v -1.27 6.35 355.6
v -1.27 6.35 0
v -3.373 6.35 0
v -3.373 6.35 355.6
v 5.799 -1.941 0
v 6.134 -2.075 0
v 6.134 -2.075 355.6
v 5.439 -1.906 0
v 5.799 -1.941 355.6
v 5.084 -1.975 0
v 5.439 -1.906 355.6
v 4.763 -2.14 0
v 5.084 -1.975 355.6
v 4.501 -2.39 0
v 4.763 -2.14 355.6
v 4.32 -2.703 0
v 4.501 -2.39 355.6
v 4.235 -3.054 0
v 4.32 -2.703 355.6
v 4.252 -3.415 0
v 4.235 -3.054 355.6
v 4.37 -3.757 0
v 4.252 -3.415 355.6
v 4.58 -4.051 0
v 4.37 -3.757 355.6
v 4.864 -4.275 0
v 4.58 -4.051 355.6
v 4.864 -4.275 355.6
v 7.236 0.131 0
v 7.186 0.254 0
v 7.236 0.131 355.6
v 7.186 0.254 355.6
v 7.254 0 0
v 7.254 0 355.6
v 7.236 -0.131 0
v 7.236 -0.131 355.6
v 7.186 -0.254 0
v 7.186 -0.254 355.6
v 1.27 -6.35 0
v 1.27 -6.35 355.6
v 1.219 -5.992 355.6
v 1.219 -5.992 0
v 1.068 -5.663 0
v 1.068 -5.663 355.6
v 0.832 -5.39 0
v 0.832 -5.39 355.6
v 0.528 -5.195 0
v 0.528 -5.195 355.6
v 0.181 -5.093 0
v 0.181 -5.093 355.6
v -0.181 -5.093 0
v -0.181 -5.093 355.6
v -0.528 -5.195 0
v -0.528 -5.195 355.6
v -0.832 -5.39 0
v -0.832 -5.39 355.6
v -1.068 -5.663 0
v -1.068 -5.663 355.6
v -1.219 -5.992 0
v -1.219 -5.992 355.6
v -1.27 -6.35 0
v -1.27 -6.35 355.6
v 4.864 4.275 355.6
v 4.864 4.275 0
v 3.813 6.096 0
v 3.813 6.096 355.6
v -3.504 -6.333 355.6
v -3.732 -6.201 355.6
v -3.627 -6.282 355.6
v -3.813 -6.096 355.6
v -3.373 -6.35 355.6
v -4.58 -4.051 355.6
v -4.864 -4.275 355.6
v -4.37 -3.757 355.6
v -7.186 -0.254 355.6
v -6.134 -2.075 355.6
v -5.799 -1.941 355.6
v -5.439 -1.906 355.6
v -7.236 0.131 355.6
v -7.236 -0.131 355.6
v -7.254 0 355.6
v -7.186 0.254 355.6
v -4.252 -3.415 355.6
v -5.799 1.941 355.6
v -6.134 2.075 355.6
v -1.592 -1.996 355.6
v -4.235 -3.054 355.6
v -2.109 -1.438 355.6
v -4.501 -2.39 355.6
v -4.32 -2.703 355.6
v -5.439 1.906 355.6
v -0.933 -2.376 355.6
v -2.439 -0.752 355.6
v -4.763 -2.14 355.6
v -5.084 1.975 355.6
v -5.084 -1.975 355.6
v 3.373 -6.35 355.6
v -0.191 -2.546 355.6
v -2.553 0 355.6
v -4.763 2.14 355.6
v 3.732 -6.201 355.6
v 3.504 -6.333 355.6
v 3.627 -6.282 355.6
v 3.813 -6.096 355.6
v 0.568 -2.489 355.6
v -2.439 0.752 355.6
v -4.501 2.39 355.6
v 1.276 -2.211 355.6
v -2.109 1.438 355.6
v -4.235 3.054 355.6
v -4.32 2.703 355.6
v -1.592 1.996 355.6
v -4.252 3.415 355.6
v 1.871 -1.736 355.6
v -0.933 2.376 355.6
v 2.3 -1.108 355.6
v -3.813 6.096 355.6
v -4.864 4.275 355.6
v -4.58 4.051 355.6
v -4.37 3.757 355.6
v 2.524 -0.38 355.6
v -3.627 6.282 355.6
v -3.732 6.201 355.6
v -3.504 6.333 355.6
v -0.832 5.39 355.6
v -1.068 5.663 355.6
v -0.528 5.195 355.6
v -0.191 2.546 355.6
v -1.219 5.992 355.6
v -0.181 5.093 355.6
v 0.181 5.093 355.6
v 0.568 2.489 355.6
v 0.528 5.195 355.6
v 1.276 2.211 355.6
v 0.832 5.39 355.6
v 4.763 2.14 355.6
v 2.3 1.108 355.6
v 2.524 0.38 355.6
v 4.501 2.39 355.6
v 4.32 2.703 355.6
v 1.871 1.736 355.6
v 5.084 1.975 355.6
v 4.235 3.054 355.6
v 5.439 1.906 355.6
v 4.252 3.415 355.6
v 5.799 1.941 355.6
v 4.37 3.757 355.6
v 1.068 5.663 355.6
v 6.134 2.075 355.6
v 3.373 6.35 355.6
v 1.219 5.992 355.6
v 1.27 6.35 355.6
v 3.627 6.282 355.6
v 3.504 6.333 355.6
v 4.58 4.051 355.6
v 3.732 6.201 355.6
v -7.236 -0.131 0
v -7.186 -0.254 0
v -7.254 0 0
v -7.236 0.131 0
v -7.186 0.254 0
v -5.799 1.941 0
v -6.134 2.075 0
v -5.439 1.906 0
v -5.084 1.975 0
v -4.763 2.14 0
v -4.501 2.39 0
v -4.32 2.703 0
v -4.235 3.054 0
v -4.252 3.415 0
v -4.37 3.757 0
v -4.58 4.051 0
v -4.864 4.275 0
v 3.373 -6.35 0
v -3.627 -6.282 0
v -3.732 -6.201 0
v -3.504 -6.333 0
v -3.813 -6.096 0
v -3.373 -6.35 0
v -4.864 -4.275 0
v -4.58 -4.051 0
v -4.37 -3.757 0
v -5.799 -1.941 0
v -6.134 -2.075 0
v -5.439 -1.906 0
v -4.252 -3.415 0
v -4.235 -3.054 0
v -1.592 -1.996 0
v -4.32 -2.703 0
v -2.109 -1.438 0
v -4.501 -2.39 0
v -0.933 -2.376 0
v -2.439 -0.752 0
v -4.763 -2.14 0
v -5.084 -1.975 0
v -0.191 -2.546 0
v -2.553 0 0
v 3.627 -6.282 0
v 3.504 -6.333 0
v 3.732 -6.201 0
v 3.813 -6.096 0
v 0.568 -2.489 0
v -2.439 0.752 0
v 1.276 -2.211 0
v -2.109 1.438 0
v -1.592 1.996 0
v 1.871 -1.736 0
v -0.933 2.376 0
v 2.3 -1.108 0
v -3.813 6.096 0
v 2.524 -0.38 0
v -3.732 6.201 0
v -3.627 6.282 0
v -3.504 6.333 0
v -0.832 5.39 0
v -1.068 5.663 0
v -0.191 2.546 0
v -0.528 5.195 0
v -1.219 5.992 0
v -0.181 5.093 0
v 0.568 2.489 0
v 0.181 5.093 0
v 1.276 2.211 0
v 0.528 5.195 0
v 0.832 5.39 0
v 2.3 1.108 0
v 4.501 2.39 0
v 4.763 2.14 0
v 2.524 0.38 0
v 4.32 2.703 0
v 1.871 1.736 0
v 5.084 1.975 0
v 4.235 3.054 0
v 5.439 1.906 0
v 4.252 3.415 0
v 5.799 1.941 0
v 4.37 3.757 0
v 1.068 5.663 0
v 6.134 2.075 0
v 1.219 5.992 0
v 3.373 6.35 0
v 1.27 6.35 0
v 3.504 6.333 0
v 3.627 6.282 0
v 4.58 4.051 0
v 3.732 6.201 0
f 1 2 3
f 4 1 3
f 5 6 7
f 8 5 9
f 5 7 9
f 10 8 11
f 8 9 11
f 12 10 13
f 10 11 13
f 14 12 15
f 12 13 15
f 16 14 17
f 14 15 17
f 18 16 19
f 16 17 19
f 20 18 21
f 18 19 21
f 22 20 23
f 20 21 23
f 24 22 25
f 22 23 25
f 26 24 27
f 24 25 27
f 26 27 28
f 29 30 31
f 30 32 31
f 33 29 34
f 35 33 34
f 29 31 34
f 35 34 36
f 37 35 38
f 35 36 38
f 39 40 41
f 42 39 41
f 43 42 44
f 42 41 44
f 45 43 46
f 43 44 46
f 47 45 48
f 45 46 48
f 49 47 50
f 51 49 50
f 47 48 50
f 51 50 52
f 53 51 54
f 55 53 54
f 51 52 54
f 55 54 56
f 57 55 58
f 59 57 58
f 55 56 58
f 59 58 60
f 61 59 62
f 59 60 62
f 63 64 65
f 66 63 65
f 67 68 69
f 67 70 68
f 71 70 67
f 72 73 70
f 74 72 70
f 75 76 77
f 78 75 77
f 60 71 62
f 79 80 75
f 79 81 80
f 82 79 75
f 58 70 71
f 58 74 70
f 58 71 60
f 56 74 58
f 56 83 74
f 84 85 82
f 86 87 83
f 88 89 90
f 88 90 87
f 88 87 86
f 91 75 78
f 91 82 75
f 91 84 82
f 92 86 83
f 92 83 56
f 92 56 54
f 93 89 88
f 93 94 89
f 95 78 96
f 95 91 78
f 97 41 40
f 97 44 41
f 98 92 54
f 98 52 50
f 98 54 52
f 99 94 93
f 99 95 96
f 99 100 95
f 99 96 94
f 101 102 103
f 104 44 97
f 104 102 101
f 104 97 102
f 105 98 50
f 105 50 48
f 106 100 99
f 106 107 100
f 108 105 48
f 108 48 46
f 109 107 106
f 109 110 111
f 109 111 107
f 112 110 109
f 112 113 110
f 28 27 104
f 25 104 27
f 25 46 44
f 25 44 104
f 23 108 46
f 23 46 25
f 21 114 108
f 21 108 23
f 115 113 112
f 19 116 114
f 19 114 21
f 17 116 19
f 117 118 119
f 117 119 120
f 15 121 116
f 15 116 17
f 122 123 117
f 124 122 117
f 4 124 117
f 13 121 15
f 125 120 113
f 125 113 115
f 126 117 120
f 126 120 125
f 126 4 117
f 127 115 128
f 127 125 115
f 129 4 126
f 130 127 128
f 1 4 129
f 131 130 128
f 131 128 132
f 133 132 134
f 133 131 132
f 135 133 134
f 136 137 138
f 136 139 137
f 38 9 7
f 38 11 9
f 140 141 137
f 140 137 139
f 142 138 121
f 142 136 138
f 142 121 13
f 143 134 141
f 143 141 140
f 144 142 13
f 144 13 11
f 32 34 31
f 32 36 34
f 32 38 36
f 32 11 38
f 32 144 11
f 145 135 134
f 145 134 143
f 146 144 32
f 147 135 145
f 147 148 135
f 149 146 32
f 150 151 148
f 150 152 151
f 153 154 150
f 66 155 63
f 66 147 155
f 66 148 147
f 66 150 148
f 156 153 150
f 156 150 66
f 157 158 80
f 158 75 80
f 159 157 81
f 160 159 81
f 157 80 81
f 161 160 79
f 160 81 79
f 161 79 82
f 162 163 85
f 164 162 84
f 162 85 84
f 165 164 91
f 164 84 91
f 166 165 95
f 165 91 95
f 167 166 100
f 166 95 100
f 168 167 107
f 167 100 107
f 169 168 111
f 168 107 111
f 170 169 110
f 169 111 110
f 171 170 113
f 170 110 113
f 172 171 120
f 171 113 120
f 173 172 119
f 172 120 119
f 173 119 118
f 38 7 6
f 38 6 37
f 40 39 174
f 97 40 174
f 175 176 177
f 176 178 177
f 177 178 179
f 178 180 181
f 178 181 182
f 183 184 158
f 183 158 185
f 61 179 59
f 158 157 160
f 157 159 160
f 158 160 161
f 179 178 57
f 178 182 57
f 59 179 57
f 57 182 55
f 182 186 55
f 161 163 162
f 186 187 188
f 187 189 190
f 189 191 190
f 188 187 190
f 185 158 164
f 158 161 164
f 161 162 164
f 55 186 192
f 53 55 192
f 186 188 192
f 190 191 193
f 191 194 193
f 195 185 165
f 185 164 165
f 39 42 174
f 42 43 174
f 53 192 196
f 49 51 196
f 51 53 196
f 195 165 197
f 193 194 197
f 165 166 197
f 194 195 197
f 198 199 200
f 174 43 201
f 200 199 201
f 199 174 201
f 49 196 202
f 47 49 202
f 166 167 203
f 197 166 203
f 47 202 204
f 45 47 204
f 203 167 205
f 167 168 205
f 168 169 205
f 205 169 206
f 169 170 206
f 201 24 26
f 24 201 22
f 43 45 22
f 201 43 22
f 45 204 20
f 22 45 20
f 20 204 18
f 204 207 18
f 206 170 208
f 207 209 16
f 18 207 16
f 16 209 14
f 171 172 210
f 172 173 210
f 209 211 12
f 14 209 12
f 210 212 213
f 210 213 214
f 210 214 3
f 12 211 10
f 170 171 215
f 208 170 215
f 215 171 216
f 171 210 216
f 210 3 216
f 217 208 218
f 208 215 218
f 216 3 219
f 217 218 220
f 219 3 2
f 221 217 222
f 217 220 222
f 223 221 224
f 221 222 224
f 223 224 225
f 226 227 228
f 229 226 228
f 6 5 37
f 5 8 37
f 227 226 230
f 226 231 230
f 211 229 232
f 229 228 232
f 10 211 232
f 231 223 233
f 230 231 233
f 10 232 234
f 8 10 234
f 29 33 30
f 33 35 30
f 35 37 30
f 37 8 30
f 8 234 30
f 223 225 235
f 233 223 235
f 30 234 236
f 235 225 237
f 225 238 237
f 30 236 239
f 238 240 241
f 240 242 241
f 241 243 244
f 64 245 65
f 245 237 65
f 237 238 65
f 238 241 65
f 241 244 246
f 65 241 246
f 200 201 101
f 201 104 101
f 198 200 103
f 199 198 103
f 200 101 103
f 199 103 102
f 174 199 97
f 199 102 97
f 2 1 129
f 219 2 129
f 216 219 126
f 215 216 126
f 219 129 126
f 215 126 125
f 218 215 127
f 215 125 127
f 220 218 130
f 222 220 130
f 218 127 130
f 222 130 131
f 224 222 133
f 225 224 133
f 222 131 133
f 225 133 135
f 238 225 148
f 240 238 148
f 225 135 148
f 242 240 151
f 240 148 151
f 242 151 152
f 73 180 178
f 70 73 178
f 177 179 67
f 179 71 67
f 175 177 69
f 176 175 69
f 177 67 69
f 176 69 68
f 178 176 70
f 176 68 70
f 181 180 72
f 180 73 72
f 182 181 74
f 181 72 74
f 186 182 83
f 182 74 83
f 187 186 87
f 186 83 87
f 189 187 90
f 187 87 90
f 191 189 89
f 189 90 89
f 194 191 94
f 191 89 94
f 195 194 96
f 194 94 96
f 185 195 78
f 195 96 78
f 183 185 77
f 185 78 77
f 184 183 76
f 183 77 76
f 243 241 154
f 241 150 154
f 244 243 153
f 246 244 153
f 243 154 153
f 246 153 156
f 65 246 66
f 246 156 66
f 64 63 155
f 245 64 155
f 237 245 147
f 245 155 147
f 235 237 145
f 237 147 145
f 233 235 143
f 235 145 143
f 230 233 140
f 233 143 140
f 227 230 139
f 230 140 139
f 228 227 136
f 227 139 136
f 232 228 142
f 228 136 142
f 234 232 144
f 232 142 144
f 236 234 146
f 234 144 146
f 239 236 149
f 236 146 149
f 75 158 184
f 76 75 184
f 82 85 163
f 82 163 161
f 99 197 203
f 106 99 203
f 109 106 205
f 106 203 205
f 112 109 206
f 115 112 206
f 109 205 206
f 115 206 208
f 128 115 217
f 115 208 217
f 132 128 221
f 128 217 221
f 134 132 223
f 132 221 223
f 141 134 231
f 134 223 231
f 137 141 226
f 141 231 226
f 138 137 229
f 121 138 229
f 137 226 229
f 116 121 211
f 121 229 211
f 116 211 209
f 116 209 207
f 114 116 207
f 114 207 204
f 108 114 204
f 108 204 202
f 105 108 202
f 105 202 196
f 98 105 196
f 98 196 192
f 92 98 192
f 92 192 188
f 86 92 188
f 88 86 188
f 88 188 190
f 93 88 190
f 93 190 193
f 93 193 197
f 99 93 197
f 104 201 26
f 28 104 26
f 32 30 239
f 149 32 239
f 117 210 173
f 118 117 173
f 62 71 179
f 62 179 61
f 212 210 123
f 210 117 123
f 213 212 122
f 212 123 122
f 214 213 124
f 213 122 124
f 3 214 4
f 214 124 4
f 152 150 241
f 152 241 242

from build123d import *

# Parameters (mm, degrees)
BOSS_EXTRUDE1_DEPTH     = 355.6
SKETCH2_R               = 1.27
SKETCH2_R_2             = 2.54
CUT_EXTRUDE1_DEPTH      = 356.6
FILLET1_R               = 0.508
F_1_4_20_TAPPED_HOLE3_D = 5.1054


with BuildPart() as part:
    # Sketch1 → Boss-Extrude1 (new body)
    with BuildSketch(Plane.XY):
        Polygon((7.332348419, 0), (3.666174209, 6.35), (-3.666174209, 6.35), (-7.332348419, 0), (-3.666174209, -6.35), (3.666174209, -6.35), align=None)
    extrude(amount=BOSS_EXTRUDE1_DEPTH)

    # Sketch2 → Cut-Extrude1 (cut, through all)
    with BuildSketch(Plane.XY.offset(355.6)):
        with Locations((0, 6.35)):
            Circle(SKETCH2_R)
        with Locations((5.499261314, 3.175)):
            Circle(SKETCH2_R)
        with Locations((5.499261314, -3.175)):
            Circle(SKETCH2_R)
        with Locations((0, -6.35)):
            Circle(SKETCH2_R)
        with Locations((-5.499261314, -3.175)):
            Circle(SKETCH2_R)
        with Locations((-5.499261314, 3.175)):
            Circle(SKETCH2_R)
        Circle(SKETCH2_R_2)
    extrude(amount=-CUT_EXTRUDE1_DEPTH, mode=Mode.SUBTRACT)

    # Fillet1
    fillet1_edges = [part.edges().sort_by_distance(p)[0] for p in [
        (3.666174209, -6.35, 177.8),
        (-3.666174209, -6.35, 177.8),
        (-7.332348419, 0, 177.8),
        (-3.666174209, 6.35, 177.8),
        (3.666174209, 6.35, 177.8),
        (7.332348419, 0, 177.8),
    ]]
    fillet(fillet1_edges, radius=FILLET1_R)

    # 1/4-20 Tapped Hole3 (through all)
    with Locations(Plane.XY.offset(355.6)):
        with Locations((0, 0)):
            f_1_4_20_tapped_hole3 = Hole(F_1_4_20_TAPPED_HOLE3_D / 2)

    # Mirror1: 1/4-20 Tapped Hole3 across plane
    add(f_1_4_20_tapped_hole3.mirror(Plane.XY.offset(177.8)), mode=Mode.SUBTRACT)


solid = part.part
